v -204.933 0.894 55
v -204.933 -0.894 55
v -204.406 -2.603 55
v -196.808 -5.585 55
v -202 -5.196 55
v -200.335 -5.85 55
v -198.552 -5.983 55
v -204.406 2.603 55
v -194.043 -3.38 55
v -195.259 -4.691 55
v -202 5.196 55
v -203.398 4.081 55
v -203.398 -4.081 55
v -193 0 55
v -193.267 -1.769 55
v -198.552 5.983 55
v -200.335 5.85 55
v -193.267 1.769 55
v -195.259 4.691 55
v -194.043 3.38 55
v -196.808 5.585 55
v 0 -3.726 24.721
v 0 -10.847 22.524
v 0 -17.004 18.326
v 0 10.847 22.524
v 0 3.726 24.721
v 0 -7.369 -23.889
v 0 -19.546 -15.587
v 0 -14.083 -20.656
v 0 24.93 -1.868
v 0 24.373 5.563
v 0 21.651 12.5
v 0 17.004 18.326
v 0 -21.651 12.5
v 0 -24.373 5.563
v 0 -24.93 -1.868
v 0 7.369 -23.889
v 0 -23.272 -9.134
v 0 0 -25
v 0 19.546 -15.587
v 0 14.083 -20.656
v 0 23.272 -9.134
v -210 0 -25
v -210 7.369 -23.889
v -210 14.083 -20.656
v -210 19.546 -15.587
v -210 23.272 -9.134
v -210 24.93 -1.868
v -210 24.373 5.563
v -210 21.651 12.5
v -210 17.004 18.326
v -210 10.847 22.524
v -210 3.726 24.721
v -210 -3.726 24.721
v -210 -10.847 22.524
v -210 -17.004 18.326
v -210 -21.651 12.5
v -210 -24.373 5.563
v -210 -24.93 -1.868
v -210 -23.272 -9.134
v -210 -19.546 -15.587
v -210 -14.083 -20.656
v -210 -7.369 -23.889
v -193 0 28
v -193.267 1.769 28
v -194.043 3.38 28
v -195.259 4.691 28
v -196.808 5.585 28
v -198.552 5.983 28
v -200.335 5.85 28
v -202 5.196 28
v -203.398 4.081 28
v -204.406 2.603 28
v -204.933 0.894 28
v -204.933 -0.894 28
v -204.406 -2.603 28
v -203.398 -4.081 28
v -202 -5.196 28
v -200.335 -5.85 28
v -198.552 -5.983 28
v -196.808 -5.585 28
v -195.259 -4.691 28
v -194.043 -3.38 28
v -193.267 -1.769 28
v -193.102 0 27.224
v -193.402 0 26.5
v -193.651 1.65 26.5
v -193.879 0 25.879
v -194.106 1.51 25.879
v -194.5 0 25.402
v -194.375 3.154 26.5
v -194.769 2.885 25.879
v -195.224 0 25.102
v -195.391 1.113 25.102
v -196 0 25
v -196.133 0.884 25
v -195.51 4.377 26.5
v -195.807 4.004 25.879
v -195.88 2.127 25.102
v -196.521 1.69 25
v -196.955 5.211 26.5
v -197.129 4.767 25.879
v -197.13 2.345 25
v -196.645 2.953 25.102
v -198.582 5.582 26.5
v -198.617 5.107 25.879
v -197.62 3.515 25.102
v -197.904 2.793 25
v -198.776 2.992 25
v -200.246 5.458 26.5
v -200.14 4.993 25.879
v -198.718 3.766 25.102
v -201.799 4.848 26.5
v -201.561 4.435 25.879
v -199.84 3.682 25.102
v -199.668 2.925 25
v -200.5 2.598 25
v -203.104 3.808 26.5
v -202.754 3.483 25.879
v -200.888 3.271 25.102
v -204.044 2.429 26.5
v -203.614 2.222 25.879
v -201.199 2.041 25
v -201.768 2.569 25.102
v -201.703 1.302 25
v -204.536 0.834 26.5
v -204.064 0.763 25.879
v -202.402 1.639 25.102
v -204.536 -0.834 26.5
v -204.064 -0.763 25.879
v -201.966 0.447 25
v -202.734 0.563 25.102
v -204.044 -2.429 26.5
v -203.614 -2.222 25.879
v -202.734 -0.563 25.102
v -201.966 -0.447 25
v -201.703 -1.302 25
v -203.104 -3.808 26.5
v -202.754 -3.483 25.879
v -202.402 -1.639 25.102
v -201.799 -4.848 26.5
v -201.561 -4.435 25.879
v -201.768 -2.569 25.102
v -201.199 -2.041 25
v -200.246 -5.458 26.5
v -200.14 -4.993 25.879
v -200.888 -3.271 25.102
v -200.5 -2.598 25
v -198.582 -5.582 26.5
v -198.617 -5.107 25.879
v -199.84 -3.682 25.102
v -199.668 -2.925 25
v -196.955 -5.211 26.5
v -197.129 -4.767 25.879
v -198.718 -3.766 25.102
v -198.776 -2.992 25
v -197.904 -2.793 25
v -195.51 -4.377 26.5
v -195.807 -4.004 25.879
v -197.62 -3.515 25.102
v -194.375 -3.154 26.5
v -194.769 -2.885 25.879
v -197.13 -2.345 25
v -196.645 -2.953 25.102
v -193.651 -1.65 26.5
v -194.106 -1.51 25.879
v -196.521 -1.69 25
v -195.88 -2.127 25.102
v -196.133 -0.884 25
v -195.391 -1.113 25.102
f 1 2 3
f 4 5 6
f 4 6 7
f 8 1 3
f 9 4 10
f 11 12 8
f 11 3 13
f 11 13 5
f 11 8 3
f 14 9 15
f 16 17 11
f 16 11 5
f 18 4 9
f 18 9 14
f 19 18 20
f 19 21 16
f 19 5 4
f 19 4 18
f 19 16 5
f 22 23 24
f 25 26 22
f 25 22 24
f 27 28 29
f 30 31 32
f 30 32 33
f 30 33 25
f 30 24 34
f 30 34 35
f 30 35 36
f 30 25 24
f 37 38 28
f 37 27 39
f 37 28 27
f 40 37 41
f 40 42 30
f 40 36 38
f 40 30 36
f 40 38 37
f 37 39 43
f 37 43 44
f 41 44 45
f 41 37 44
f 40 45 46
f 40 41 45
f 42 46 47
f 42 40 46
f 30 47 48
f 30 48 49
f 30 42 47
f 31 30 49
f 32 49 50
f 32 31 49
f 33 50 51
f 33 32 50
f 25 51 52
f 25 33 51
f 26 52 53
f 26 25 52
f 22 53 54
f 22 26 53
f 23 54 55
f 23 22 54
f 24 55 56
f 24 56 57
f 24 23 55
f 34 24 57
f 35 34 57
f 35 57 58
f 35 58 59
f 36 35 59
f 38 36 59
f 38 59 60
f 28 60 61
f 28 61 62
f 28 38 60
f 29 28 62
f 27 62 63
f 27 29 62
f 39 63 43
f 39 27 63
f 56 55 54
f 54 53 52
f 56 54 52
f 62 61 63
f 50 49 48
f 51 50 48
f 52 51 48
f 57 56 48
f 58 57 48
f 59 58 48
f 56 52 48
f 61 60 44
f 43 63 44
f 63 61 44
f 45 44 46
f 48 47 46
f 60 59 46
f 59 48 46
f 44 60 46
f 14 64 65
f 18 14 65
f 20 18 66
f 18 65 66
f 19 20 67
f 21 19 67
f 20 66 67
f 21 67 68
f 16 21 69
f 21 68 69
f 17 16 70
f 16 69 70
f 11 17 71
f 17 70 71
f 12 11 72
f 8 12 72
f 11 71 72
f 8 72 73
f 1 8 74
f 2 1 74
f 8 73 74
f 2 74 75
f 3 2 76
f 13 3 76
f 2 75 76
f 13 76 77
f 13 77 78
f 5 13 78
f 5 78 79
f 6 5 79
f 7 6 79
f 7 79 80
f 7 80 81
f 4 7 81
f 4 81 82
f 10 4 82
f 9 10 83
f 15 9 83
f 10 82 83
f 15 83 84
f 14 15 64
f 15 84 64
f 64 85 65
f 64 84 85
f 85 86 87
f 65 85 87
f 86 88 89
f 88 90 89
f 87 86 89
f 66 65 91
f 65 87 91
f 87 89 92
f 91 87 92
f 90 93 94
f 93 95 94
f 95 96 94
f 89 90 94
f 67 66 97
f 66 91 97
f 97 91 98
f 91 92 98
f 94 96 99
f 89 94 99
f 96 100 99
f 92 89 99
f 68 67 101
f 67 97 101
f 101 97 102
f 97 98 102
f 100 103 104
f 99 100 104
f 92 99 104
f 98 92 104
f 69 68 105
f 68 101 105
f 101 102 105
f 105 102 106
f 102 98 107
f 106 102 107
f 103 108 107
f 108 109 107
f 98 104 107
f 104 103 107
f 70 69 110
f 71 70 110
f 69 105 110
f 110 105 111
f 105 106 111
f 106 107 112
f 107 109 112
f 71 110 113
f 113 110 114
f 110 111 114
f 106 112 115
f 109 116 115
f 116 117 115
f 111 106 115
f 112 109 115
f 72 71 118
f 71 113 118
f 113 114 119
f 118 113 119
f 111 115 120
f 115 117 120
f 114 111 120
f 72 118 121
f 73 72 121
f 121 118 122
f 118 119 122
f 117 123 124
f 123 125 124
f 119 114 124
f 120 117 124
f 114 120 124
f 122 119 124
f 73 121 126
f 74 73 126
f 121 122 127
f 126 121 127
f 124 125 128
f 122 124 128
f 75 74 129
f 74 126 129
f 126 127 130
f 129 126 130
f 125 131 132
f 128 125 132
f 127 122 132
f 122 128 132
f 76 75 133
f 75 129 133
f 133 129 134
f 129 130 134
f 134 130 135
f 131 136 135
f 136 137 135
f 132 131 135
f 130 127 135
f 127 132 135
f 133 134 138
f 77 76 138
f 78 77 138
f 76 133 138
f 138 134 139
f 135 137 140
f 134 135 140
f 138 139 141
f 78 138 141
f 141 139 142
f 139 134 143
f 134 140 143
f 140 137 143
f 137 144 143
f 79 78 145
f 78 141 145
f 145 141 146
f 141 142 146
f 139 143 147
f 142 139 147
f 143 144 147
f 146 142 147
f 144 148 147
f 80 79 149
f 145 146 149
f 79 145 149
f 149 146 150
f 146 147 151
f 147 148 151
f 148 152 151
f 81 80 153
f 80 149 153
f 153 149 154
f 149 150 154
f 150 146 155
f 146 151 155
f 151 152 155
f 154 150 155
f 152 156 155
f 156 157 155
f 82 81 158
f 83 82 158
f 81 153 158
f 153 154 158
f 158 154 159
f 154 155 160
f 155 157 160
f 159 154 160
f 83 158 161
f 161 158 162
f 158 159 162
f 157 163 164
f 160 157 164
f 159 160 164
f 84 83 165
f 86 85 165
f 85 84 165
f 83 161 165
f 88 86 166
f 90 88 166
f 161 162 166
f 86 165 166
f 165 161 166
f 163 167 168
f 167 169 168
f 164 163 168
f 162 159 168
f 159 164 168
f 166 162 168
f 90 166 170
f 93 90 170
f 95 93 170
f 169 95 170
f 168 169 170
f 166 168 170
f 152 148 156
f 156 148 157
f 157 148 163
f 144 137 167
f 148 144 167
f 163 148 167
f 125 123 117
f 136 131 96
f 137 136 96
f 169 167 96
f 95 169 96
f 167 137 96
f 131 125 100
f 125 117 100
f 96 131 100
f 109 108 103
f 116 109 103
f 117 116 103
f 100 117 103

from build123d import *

# Parameters (mm, degrees)
SKETCH1_R           = 25
BOSS_EXTRUDE1_DEPTH = 210
BOSS_EXTRUDE2_START = 25
SKETCH2_R           = 6
BOSS_EXTRUDE2_DEPTH = 30
FILLET1_R           = 3


with BuildPart() as part:
    # Sketch1 → Boss-Extrude1 (new body)
    with BuildSketch(Plane(origin=(0, 0, 0), x_dir=(0, 0, -1), z_dir=(1, 0, 0))):
        Circle(SKETCH1_R)
    extrude(amount=-BOSS_EXTRUDE1_DEPTH)


with BuildPart() as body_2:
    # Sketch2 → Boss-Extrude2 (new body)
    with BuildSketch(Plane.XY.offset(BOSS_EXTRUDE2_START)):
        with Locations((-199, 0)):
            Circle(SKETCH2_R)
    extrude(amount=BOSS_EXTRUDE2_DEPTH)

    # Fillet1
    fillet1_edges = [body_2.edges().sort_by_distance(p)[0] for p in [
        (-205, 0, 25),
    ]]
    fillet(fillet1_edges, radius=FILLET1_R)


solid = Compound([part.part, body_2.part])
